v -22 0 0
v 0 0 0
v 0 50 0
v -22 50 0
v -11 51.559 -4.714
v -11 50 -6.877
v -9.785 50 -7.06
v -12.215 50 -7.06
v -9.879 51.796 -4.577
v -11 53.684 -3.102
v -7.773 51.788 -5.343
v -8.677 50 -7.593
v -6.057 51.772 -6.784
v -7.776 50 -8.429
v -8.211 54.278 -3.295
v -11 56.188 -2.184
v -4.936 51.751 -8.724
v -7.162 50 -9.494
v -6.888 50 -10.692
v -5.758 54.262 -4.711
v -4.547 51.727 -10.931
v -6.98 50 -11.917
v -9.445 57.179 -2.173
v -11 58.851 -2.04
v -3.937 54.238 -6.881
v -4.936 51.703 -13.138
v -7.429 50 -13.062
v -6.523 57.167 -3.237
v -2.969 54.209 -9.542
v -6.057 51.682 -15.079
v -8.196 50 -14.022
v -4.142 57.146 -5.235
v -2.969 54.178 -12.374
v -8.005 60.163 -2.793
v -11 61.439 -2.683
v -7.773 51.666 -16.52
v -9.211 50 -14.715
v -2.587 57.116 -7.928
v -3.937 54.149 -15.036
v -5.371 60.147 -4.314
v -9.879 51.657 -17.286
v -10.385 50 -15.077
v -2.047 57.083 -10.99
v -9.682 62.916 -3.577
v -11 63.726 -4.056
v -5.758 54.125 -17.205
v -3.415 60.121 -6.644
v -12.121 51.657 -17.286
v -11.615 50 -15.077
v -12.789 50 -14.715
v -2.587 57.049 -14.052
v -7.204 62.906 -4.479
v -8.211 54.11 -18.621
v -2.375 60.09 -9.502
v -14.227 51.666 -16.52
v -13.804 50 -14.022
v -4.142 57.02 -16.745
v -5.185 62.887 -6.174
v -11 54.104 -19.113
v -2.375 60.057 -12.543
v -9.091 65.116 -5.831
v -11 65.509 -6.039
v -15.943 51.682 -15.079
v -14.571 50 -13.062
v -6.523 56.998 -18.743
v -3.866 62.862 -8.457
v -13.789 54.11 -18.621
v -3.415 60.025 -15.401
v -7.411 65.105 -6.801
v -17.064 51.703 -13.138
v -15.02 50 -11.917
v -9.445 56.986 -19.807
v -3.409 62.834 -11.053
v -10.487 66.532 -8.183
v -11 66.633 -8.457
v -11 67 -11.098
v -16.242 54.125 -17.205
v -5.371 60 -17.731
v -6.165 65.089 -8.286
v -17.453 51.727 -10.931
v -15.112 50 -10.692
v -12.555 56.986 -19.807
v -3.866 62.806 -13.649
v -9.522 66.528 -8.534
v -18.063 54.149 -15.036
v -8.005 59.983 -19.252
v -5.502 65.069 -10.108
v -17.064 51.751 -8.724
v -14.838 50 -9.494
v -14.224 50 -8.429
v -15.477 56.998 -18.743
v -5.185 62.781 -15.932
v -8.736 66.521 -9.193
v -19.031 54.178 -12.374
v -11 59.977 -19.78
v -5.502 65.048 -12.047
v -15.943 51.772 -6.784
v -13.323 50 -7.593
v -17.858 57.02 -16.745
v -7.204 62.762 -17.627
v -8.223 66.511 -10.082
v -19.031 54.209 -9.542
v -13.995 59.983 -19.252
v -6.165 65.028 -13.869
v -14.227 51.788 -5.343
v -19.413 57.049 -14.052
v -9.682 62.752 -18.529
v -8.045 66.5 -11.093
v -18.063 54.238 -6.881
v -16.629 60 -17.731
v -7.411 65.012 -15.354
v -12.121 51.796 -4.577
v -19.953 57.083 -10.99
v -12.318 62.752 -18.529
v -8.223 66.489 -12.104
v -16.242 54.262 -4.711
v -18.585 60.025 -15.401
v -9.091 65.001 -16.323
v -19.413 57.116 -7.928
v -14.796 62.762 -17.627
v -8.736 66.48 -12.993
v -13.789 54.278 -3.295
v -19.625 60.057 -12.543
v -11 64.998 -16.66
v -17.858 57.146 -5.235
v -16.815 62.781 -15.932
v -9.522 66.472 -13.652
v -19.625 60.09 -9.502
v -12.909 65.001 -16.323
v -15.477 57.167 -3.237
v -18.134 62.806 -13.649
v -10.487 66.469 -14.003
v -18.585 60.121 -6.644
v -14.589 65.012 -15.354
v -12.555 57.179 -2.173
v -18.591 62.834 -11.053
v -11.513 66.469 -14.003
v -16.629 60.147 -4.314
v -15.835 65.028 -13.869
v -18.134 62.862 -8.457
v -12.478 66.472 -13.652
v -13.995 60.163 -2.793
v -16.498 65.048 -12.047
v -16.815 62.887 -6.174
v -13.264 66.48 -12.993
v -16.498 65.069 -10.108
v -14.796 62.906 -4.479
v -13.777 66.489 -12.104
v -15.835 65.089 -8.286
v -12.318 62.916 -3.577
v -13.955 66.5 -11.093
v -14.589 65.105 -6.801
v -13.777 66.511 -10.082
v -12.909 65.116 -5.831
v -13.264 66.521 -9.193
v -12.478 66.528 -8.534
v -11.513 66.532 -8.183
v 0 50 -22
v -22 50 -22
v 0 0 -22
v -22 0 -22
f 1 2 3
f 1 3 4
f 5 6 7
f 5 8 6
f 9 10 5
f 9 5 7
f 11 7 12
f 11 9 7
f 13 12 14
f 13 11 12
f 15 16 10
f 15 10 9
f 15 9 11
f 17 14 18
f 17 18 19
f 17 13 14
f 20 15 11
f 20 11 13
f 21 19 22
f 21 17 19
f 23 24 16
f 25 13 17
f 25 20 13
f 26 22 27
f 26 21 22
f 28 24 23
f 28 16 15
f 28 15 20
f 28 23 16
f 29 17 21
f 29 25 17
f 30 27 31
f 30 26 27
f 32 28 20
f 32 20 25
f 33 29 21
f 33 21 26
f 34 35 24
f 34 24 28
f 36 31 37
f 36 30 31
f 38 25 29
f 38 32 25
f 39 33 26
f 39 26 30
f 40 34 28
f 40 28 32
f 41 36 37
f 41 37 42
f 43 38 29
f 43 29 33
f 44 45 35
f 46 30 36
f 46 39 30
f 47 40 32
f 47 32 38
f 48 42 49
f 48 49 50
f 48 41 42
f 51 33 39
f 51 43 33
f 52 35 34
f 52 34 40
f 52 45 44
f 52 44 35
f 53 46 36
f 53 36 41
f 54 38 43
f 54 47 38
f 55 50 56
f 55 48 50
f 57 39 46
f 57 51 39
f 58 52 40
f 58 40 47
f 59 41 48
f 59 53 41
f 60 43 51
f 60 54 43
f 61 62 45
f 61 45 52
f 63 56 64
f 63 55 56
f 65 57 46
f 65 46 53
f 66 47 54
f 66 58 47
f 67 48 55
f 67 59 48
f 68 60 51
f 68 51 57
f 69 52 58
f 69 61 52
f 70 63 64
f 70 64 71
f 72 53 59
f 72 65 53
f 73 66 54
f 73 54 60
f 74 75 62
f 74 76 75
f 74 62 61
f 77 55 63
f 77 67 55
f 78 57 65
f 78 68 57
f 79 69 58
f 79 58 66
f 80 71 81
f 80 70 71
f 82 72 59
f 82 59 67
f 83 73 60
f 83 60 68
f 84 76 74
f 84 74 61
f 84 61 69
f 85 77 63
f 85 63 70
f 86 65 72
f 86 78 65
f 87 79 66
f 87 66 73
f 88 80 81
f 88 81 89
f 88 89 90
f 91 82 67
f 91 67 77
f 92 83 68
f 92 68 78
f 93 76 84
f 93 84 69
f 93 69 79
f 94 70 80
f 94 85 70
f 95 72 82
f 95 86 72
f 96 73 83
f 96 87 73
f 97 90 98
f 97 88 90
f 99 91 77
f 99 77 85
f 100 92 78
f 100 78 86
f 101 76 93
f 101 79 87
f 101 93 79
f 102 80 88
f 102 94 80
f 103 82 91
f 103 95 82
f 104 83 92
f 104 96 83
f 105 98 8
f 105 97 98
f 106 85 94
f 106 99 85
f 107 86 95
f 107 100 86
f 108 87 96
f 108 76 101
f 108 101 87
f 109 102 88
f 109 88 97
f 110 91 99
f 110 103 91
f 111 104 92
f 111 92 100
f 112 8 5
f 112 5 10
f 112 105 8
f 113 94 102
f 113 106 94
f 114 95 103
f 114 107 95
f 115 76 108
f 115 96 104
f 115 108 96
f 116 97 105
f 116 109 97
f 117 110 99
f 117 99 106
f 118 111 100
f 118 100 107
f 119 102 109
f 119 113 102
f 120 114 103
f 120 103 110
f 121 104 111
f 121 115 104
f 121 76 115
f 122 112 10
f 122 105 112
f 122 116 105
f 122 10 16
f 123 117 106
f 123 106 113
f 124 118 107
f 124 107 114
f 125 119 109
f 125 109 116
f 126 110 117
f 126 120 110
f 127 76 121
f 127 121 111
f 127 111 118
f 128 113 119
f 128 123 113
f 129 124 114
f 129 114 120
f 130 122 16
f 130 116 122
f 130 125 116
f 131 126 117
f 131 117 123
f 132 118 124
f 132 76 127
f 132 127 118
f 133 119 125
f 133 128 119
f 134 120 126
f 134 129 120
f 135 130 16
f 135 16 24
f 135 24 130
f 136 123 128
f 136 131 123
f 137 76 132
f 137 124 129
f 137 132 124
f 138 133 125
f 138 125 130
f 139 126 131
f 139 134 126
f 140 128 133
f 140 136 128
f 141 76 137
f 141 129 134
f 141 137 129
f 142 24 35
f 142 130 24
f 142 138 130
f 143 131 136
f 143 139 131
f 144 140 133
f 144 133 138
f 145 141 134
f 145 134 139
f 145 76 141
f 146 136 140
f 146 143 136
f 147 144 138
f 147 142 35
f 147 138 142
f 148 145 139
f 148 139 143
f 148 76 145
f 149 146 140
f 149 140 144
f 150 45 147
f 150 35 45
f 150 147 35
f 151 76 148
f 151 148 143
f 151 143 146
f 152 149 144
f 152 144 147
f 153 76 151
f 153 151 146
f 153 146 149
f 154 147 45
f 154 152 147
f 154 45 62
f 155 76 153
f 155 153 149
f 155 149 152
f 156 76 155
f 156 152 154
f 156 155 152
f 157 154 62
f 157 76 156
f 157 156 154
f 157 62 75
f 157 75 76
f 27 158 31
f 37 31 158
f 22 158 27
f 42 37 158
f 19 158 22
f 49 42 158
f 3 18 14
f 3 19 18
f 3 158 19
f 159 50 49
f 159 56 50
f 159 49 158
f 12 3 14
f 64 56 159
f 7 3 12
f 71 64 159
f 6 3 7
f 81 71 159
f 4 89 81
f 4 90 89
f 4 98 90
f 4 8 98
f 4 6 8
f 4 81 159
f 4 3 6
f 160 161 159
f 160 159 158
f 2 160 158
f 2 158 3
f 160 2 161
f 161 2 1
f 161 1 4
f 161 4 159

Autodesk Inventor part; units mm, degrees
ref_plane "YZ Plane" through (0, 0, 0) normal (1, 0, 0) x (0, 1, 0)
ref_plane "XZ Plane" through (0, 0, 0) normal (0, 1, 0) x (-1, 0, 0)
ref_plane "XY Plane" through (0, 0, 0) normal (0, 0, 1) x (1, 0, 0)
sketch "Sketch6" plane through (0, 0, 0) normal (0, 1, 0) x (-1, 0, 0)
  line L0 (0, 0) -> (22, 0)
  line L1 (22, 0) -> (22, -22)
  line L2 (22, -22) -> (0, -22)
  line L3 (0, -22) -> (0, 0)
  dimension "d18" = 22
  dimension "d19" = 22
extrude "Extrusion3" add sketch "Sketch6" along normal blind 50
ref_plane "Work Plane1" through (-11, 0, -22) normal (-1, 0, 0) x (0, 0, 1)
sketch "Sketch8" plane through (-11, 0, -22) normal (-1, 0, 0) x (0, 0, 1)
  line L0 (0, 50) -> (22, 50) projected
  line L1 (11, 50) -> (11, 58)
  circle A0 centre (11, 58) radius 9
  line L2 (11.0985, 49.0005) -> (10.9015, 66.9995)
  point P0 (22, 0)
  dimension "d30" = 8
  dimension "d31" = 18
revolve "Revolution2" add sketch "Sketch8" angle 360 about axis through (-11, 49.0005, -10.9015) along (0, 0.9999401, -0.0109435) picked at (12.4036, 52.6667) picked at (13.3498, 49.8198) contours A0 L0 L2 | L2 L0 A0
properties part number "queen"
